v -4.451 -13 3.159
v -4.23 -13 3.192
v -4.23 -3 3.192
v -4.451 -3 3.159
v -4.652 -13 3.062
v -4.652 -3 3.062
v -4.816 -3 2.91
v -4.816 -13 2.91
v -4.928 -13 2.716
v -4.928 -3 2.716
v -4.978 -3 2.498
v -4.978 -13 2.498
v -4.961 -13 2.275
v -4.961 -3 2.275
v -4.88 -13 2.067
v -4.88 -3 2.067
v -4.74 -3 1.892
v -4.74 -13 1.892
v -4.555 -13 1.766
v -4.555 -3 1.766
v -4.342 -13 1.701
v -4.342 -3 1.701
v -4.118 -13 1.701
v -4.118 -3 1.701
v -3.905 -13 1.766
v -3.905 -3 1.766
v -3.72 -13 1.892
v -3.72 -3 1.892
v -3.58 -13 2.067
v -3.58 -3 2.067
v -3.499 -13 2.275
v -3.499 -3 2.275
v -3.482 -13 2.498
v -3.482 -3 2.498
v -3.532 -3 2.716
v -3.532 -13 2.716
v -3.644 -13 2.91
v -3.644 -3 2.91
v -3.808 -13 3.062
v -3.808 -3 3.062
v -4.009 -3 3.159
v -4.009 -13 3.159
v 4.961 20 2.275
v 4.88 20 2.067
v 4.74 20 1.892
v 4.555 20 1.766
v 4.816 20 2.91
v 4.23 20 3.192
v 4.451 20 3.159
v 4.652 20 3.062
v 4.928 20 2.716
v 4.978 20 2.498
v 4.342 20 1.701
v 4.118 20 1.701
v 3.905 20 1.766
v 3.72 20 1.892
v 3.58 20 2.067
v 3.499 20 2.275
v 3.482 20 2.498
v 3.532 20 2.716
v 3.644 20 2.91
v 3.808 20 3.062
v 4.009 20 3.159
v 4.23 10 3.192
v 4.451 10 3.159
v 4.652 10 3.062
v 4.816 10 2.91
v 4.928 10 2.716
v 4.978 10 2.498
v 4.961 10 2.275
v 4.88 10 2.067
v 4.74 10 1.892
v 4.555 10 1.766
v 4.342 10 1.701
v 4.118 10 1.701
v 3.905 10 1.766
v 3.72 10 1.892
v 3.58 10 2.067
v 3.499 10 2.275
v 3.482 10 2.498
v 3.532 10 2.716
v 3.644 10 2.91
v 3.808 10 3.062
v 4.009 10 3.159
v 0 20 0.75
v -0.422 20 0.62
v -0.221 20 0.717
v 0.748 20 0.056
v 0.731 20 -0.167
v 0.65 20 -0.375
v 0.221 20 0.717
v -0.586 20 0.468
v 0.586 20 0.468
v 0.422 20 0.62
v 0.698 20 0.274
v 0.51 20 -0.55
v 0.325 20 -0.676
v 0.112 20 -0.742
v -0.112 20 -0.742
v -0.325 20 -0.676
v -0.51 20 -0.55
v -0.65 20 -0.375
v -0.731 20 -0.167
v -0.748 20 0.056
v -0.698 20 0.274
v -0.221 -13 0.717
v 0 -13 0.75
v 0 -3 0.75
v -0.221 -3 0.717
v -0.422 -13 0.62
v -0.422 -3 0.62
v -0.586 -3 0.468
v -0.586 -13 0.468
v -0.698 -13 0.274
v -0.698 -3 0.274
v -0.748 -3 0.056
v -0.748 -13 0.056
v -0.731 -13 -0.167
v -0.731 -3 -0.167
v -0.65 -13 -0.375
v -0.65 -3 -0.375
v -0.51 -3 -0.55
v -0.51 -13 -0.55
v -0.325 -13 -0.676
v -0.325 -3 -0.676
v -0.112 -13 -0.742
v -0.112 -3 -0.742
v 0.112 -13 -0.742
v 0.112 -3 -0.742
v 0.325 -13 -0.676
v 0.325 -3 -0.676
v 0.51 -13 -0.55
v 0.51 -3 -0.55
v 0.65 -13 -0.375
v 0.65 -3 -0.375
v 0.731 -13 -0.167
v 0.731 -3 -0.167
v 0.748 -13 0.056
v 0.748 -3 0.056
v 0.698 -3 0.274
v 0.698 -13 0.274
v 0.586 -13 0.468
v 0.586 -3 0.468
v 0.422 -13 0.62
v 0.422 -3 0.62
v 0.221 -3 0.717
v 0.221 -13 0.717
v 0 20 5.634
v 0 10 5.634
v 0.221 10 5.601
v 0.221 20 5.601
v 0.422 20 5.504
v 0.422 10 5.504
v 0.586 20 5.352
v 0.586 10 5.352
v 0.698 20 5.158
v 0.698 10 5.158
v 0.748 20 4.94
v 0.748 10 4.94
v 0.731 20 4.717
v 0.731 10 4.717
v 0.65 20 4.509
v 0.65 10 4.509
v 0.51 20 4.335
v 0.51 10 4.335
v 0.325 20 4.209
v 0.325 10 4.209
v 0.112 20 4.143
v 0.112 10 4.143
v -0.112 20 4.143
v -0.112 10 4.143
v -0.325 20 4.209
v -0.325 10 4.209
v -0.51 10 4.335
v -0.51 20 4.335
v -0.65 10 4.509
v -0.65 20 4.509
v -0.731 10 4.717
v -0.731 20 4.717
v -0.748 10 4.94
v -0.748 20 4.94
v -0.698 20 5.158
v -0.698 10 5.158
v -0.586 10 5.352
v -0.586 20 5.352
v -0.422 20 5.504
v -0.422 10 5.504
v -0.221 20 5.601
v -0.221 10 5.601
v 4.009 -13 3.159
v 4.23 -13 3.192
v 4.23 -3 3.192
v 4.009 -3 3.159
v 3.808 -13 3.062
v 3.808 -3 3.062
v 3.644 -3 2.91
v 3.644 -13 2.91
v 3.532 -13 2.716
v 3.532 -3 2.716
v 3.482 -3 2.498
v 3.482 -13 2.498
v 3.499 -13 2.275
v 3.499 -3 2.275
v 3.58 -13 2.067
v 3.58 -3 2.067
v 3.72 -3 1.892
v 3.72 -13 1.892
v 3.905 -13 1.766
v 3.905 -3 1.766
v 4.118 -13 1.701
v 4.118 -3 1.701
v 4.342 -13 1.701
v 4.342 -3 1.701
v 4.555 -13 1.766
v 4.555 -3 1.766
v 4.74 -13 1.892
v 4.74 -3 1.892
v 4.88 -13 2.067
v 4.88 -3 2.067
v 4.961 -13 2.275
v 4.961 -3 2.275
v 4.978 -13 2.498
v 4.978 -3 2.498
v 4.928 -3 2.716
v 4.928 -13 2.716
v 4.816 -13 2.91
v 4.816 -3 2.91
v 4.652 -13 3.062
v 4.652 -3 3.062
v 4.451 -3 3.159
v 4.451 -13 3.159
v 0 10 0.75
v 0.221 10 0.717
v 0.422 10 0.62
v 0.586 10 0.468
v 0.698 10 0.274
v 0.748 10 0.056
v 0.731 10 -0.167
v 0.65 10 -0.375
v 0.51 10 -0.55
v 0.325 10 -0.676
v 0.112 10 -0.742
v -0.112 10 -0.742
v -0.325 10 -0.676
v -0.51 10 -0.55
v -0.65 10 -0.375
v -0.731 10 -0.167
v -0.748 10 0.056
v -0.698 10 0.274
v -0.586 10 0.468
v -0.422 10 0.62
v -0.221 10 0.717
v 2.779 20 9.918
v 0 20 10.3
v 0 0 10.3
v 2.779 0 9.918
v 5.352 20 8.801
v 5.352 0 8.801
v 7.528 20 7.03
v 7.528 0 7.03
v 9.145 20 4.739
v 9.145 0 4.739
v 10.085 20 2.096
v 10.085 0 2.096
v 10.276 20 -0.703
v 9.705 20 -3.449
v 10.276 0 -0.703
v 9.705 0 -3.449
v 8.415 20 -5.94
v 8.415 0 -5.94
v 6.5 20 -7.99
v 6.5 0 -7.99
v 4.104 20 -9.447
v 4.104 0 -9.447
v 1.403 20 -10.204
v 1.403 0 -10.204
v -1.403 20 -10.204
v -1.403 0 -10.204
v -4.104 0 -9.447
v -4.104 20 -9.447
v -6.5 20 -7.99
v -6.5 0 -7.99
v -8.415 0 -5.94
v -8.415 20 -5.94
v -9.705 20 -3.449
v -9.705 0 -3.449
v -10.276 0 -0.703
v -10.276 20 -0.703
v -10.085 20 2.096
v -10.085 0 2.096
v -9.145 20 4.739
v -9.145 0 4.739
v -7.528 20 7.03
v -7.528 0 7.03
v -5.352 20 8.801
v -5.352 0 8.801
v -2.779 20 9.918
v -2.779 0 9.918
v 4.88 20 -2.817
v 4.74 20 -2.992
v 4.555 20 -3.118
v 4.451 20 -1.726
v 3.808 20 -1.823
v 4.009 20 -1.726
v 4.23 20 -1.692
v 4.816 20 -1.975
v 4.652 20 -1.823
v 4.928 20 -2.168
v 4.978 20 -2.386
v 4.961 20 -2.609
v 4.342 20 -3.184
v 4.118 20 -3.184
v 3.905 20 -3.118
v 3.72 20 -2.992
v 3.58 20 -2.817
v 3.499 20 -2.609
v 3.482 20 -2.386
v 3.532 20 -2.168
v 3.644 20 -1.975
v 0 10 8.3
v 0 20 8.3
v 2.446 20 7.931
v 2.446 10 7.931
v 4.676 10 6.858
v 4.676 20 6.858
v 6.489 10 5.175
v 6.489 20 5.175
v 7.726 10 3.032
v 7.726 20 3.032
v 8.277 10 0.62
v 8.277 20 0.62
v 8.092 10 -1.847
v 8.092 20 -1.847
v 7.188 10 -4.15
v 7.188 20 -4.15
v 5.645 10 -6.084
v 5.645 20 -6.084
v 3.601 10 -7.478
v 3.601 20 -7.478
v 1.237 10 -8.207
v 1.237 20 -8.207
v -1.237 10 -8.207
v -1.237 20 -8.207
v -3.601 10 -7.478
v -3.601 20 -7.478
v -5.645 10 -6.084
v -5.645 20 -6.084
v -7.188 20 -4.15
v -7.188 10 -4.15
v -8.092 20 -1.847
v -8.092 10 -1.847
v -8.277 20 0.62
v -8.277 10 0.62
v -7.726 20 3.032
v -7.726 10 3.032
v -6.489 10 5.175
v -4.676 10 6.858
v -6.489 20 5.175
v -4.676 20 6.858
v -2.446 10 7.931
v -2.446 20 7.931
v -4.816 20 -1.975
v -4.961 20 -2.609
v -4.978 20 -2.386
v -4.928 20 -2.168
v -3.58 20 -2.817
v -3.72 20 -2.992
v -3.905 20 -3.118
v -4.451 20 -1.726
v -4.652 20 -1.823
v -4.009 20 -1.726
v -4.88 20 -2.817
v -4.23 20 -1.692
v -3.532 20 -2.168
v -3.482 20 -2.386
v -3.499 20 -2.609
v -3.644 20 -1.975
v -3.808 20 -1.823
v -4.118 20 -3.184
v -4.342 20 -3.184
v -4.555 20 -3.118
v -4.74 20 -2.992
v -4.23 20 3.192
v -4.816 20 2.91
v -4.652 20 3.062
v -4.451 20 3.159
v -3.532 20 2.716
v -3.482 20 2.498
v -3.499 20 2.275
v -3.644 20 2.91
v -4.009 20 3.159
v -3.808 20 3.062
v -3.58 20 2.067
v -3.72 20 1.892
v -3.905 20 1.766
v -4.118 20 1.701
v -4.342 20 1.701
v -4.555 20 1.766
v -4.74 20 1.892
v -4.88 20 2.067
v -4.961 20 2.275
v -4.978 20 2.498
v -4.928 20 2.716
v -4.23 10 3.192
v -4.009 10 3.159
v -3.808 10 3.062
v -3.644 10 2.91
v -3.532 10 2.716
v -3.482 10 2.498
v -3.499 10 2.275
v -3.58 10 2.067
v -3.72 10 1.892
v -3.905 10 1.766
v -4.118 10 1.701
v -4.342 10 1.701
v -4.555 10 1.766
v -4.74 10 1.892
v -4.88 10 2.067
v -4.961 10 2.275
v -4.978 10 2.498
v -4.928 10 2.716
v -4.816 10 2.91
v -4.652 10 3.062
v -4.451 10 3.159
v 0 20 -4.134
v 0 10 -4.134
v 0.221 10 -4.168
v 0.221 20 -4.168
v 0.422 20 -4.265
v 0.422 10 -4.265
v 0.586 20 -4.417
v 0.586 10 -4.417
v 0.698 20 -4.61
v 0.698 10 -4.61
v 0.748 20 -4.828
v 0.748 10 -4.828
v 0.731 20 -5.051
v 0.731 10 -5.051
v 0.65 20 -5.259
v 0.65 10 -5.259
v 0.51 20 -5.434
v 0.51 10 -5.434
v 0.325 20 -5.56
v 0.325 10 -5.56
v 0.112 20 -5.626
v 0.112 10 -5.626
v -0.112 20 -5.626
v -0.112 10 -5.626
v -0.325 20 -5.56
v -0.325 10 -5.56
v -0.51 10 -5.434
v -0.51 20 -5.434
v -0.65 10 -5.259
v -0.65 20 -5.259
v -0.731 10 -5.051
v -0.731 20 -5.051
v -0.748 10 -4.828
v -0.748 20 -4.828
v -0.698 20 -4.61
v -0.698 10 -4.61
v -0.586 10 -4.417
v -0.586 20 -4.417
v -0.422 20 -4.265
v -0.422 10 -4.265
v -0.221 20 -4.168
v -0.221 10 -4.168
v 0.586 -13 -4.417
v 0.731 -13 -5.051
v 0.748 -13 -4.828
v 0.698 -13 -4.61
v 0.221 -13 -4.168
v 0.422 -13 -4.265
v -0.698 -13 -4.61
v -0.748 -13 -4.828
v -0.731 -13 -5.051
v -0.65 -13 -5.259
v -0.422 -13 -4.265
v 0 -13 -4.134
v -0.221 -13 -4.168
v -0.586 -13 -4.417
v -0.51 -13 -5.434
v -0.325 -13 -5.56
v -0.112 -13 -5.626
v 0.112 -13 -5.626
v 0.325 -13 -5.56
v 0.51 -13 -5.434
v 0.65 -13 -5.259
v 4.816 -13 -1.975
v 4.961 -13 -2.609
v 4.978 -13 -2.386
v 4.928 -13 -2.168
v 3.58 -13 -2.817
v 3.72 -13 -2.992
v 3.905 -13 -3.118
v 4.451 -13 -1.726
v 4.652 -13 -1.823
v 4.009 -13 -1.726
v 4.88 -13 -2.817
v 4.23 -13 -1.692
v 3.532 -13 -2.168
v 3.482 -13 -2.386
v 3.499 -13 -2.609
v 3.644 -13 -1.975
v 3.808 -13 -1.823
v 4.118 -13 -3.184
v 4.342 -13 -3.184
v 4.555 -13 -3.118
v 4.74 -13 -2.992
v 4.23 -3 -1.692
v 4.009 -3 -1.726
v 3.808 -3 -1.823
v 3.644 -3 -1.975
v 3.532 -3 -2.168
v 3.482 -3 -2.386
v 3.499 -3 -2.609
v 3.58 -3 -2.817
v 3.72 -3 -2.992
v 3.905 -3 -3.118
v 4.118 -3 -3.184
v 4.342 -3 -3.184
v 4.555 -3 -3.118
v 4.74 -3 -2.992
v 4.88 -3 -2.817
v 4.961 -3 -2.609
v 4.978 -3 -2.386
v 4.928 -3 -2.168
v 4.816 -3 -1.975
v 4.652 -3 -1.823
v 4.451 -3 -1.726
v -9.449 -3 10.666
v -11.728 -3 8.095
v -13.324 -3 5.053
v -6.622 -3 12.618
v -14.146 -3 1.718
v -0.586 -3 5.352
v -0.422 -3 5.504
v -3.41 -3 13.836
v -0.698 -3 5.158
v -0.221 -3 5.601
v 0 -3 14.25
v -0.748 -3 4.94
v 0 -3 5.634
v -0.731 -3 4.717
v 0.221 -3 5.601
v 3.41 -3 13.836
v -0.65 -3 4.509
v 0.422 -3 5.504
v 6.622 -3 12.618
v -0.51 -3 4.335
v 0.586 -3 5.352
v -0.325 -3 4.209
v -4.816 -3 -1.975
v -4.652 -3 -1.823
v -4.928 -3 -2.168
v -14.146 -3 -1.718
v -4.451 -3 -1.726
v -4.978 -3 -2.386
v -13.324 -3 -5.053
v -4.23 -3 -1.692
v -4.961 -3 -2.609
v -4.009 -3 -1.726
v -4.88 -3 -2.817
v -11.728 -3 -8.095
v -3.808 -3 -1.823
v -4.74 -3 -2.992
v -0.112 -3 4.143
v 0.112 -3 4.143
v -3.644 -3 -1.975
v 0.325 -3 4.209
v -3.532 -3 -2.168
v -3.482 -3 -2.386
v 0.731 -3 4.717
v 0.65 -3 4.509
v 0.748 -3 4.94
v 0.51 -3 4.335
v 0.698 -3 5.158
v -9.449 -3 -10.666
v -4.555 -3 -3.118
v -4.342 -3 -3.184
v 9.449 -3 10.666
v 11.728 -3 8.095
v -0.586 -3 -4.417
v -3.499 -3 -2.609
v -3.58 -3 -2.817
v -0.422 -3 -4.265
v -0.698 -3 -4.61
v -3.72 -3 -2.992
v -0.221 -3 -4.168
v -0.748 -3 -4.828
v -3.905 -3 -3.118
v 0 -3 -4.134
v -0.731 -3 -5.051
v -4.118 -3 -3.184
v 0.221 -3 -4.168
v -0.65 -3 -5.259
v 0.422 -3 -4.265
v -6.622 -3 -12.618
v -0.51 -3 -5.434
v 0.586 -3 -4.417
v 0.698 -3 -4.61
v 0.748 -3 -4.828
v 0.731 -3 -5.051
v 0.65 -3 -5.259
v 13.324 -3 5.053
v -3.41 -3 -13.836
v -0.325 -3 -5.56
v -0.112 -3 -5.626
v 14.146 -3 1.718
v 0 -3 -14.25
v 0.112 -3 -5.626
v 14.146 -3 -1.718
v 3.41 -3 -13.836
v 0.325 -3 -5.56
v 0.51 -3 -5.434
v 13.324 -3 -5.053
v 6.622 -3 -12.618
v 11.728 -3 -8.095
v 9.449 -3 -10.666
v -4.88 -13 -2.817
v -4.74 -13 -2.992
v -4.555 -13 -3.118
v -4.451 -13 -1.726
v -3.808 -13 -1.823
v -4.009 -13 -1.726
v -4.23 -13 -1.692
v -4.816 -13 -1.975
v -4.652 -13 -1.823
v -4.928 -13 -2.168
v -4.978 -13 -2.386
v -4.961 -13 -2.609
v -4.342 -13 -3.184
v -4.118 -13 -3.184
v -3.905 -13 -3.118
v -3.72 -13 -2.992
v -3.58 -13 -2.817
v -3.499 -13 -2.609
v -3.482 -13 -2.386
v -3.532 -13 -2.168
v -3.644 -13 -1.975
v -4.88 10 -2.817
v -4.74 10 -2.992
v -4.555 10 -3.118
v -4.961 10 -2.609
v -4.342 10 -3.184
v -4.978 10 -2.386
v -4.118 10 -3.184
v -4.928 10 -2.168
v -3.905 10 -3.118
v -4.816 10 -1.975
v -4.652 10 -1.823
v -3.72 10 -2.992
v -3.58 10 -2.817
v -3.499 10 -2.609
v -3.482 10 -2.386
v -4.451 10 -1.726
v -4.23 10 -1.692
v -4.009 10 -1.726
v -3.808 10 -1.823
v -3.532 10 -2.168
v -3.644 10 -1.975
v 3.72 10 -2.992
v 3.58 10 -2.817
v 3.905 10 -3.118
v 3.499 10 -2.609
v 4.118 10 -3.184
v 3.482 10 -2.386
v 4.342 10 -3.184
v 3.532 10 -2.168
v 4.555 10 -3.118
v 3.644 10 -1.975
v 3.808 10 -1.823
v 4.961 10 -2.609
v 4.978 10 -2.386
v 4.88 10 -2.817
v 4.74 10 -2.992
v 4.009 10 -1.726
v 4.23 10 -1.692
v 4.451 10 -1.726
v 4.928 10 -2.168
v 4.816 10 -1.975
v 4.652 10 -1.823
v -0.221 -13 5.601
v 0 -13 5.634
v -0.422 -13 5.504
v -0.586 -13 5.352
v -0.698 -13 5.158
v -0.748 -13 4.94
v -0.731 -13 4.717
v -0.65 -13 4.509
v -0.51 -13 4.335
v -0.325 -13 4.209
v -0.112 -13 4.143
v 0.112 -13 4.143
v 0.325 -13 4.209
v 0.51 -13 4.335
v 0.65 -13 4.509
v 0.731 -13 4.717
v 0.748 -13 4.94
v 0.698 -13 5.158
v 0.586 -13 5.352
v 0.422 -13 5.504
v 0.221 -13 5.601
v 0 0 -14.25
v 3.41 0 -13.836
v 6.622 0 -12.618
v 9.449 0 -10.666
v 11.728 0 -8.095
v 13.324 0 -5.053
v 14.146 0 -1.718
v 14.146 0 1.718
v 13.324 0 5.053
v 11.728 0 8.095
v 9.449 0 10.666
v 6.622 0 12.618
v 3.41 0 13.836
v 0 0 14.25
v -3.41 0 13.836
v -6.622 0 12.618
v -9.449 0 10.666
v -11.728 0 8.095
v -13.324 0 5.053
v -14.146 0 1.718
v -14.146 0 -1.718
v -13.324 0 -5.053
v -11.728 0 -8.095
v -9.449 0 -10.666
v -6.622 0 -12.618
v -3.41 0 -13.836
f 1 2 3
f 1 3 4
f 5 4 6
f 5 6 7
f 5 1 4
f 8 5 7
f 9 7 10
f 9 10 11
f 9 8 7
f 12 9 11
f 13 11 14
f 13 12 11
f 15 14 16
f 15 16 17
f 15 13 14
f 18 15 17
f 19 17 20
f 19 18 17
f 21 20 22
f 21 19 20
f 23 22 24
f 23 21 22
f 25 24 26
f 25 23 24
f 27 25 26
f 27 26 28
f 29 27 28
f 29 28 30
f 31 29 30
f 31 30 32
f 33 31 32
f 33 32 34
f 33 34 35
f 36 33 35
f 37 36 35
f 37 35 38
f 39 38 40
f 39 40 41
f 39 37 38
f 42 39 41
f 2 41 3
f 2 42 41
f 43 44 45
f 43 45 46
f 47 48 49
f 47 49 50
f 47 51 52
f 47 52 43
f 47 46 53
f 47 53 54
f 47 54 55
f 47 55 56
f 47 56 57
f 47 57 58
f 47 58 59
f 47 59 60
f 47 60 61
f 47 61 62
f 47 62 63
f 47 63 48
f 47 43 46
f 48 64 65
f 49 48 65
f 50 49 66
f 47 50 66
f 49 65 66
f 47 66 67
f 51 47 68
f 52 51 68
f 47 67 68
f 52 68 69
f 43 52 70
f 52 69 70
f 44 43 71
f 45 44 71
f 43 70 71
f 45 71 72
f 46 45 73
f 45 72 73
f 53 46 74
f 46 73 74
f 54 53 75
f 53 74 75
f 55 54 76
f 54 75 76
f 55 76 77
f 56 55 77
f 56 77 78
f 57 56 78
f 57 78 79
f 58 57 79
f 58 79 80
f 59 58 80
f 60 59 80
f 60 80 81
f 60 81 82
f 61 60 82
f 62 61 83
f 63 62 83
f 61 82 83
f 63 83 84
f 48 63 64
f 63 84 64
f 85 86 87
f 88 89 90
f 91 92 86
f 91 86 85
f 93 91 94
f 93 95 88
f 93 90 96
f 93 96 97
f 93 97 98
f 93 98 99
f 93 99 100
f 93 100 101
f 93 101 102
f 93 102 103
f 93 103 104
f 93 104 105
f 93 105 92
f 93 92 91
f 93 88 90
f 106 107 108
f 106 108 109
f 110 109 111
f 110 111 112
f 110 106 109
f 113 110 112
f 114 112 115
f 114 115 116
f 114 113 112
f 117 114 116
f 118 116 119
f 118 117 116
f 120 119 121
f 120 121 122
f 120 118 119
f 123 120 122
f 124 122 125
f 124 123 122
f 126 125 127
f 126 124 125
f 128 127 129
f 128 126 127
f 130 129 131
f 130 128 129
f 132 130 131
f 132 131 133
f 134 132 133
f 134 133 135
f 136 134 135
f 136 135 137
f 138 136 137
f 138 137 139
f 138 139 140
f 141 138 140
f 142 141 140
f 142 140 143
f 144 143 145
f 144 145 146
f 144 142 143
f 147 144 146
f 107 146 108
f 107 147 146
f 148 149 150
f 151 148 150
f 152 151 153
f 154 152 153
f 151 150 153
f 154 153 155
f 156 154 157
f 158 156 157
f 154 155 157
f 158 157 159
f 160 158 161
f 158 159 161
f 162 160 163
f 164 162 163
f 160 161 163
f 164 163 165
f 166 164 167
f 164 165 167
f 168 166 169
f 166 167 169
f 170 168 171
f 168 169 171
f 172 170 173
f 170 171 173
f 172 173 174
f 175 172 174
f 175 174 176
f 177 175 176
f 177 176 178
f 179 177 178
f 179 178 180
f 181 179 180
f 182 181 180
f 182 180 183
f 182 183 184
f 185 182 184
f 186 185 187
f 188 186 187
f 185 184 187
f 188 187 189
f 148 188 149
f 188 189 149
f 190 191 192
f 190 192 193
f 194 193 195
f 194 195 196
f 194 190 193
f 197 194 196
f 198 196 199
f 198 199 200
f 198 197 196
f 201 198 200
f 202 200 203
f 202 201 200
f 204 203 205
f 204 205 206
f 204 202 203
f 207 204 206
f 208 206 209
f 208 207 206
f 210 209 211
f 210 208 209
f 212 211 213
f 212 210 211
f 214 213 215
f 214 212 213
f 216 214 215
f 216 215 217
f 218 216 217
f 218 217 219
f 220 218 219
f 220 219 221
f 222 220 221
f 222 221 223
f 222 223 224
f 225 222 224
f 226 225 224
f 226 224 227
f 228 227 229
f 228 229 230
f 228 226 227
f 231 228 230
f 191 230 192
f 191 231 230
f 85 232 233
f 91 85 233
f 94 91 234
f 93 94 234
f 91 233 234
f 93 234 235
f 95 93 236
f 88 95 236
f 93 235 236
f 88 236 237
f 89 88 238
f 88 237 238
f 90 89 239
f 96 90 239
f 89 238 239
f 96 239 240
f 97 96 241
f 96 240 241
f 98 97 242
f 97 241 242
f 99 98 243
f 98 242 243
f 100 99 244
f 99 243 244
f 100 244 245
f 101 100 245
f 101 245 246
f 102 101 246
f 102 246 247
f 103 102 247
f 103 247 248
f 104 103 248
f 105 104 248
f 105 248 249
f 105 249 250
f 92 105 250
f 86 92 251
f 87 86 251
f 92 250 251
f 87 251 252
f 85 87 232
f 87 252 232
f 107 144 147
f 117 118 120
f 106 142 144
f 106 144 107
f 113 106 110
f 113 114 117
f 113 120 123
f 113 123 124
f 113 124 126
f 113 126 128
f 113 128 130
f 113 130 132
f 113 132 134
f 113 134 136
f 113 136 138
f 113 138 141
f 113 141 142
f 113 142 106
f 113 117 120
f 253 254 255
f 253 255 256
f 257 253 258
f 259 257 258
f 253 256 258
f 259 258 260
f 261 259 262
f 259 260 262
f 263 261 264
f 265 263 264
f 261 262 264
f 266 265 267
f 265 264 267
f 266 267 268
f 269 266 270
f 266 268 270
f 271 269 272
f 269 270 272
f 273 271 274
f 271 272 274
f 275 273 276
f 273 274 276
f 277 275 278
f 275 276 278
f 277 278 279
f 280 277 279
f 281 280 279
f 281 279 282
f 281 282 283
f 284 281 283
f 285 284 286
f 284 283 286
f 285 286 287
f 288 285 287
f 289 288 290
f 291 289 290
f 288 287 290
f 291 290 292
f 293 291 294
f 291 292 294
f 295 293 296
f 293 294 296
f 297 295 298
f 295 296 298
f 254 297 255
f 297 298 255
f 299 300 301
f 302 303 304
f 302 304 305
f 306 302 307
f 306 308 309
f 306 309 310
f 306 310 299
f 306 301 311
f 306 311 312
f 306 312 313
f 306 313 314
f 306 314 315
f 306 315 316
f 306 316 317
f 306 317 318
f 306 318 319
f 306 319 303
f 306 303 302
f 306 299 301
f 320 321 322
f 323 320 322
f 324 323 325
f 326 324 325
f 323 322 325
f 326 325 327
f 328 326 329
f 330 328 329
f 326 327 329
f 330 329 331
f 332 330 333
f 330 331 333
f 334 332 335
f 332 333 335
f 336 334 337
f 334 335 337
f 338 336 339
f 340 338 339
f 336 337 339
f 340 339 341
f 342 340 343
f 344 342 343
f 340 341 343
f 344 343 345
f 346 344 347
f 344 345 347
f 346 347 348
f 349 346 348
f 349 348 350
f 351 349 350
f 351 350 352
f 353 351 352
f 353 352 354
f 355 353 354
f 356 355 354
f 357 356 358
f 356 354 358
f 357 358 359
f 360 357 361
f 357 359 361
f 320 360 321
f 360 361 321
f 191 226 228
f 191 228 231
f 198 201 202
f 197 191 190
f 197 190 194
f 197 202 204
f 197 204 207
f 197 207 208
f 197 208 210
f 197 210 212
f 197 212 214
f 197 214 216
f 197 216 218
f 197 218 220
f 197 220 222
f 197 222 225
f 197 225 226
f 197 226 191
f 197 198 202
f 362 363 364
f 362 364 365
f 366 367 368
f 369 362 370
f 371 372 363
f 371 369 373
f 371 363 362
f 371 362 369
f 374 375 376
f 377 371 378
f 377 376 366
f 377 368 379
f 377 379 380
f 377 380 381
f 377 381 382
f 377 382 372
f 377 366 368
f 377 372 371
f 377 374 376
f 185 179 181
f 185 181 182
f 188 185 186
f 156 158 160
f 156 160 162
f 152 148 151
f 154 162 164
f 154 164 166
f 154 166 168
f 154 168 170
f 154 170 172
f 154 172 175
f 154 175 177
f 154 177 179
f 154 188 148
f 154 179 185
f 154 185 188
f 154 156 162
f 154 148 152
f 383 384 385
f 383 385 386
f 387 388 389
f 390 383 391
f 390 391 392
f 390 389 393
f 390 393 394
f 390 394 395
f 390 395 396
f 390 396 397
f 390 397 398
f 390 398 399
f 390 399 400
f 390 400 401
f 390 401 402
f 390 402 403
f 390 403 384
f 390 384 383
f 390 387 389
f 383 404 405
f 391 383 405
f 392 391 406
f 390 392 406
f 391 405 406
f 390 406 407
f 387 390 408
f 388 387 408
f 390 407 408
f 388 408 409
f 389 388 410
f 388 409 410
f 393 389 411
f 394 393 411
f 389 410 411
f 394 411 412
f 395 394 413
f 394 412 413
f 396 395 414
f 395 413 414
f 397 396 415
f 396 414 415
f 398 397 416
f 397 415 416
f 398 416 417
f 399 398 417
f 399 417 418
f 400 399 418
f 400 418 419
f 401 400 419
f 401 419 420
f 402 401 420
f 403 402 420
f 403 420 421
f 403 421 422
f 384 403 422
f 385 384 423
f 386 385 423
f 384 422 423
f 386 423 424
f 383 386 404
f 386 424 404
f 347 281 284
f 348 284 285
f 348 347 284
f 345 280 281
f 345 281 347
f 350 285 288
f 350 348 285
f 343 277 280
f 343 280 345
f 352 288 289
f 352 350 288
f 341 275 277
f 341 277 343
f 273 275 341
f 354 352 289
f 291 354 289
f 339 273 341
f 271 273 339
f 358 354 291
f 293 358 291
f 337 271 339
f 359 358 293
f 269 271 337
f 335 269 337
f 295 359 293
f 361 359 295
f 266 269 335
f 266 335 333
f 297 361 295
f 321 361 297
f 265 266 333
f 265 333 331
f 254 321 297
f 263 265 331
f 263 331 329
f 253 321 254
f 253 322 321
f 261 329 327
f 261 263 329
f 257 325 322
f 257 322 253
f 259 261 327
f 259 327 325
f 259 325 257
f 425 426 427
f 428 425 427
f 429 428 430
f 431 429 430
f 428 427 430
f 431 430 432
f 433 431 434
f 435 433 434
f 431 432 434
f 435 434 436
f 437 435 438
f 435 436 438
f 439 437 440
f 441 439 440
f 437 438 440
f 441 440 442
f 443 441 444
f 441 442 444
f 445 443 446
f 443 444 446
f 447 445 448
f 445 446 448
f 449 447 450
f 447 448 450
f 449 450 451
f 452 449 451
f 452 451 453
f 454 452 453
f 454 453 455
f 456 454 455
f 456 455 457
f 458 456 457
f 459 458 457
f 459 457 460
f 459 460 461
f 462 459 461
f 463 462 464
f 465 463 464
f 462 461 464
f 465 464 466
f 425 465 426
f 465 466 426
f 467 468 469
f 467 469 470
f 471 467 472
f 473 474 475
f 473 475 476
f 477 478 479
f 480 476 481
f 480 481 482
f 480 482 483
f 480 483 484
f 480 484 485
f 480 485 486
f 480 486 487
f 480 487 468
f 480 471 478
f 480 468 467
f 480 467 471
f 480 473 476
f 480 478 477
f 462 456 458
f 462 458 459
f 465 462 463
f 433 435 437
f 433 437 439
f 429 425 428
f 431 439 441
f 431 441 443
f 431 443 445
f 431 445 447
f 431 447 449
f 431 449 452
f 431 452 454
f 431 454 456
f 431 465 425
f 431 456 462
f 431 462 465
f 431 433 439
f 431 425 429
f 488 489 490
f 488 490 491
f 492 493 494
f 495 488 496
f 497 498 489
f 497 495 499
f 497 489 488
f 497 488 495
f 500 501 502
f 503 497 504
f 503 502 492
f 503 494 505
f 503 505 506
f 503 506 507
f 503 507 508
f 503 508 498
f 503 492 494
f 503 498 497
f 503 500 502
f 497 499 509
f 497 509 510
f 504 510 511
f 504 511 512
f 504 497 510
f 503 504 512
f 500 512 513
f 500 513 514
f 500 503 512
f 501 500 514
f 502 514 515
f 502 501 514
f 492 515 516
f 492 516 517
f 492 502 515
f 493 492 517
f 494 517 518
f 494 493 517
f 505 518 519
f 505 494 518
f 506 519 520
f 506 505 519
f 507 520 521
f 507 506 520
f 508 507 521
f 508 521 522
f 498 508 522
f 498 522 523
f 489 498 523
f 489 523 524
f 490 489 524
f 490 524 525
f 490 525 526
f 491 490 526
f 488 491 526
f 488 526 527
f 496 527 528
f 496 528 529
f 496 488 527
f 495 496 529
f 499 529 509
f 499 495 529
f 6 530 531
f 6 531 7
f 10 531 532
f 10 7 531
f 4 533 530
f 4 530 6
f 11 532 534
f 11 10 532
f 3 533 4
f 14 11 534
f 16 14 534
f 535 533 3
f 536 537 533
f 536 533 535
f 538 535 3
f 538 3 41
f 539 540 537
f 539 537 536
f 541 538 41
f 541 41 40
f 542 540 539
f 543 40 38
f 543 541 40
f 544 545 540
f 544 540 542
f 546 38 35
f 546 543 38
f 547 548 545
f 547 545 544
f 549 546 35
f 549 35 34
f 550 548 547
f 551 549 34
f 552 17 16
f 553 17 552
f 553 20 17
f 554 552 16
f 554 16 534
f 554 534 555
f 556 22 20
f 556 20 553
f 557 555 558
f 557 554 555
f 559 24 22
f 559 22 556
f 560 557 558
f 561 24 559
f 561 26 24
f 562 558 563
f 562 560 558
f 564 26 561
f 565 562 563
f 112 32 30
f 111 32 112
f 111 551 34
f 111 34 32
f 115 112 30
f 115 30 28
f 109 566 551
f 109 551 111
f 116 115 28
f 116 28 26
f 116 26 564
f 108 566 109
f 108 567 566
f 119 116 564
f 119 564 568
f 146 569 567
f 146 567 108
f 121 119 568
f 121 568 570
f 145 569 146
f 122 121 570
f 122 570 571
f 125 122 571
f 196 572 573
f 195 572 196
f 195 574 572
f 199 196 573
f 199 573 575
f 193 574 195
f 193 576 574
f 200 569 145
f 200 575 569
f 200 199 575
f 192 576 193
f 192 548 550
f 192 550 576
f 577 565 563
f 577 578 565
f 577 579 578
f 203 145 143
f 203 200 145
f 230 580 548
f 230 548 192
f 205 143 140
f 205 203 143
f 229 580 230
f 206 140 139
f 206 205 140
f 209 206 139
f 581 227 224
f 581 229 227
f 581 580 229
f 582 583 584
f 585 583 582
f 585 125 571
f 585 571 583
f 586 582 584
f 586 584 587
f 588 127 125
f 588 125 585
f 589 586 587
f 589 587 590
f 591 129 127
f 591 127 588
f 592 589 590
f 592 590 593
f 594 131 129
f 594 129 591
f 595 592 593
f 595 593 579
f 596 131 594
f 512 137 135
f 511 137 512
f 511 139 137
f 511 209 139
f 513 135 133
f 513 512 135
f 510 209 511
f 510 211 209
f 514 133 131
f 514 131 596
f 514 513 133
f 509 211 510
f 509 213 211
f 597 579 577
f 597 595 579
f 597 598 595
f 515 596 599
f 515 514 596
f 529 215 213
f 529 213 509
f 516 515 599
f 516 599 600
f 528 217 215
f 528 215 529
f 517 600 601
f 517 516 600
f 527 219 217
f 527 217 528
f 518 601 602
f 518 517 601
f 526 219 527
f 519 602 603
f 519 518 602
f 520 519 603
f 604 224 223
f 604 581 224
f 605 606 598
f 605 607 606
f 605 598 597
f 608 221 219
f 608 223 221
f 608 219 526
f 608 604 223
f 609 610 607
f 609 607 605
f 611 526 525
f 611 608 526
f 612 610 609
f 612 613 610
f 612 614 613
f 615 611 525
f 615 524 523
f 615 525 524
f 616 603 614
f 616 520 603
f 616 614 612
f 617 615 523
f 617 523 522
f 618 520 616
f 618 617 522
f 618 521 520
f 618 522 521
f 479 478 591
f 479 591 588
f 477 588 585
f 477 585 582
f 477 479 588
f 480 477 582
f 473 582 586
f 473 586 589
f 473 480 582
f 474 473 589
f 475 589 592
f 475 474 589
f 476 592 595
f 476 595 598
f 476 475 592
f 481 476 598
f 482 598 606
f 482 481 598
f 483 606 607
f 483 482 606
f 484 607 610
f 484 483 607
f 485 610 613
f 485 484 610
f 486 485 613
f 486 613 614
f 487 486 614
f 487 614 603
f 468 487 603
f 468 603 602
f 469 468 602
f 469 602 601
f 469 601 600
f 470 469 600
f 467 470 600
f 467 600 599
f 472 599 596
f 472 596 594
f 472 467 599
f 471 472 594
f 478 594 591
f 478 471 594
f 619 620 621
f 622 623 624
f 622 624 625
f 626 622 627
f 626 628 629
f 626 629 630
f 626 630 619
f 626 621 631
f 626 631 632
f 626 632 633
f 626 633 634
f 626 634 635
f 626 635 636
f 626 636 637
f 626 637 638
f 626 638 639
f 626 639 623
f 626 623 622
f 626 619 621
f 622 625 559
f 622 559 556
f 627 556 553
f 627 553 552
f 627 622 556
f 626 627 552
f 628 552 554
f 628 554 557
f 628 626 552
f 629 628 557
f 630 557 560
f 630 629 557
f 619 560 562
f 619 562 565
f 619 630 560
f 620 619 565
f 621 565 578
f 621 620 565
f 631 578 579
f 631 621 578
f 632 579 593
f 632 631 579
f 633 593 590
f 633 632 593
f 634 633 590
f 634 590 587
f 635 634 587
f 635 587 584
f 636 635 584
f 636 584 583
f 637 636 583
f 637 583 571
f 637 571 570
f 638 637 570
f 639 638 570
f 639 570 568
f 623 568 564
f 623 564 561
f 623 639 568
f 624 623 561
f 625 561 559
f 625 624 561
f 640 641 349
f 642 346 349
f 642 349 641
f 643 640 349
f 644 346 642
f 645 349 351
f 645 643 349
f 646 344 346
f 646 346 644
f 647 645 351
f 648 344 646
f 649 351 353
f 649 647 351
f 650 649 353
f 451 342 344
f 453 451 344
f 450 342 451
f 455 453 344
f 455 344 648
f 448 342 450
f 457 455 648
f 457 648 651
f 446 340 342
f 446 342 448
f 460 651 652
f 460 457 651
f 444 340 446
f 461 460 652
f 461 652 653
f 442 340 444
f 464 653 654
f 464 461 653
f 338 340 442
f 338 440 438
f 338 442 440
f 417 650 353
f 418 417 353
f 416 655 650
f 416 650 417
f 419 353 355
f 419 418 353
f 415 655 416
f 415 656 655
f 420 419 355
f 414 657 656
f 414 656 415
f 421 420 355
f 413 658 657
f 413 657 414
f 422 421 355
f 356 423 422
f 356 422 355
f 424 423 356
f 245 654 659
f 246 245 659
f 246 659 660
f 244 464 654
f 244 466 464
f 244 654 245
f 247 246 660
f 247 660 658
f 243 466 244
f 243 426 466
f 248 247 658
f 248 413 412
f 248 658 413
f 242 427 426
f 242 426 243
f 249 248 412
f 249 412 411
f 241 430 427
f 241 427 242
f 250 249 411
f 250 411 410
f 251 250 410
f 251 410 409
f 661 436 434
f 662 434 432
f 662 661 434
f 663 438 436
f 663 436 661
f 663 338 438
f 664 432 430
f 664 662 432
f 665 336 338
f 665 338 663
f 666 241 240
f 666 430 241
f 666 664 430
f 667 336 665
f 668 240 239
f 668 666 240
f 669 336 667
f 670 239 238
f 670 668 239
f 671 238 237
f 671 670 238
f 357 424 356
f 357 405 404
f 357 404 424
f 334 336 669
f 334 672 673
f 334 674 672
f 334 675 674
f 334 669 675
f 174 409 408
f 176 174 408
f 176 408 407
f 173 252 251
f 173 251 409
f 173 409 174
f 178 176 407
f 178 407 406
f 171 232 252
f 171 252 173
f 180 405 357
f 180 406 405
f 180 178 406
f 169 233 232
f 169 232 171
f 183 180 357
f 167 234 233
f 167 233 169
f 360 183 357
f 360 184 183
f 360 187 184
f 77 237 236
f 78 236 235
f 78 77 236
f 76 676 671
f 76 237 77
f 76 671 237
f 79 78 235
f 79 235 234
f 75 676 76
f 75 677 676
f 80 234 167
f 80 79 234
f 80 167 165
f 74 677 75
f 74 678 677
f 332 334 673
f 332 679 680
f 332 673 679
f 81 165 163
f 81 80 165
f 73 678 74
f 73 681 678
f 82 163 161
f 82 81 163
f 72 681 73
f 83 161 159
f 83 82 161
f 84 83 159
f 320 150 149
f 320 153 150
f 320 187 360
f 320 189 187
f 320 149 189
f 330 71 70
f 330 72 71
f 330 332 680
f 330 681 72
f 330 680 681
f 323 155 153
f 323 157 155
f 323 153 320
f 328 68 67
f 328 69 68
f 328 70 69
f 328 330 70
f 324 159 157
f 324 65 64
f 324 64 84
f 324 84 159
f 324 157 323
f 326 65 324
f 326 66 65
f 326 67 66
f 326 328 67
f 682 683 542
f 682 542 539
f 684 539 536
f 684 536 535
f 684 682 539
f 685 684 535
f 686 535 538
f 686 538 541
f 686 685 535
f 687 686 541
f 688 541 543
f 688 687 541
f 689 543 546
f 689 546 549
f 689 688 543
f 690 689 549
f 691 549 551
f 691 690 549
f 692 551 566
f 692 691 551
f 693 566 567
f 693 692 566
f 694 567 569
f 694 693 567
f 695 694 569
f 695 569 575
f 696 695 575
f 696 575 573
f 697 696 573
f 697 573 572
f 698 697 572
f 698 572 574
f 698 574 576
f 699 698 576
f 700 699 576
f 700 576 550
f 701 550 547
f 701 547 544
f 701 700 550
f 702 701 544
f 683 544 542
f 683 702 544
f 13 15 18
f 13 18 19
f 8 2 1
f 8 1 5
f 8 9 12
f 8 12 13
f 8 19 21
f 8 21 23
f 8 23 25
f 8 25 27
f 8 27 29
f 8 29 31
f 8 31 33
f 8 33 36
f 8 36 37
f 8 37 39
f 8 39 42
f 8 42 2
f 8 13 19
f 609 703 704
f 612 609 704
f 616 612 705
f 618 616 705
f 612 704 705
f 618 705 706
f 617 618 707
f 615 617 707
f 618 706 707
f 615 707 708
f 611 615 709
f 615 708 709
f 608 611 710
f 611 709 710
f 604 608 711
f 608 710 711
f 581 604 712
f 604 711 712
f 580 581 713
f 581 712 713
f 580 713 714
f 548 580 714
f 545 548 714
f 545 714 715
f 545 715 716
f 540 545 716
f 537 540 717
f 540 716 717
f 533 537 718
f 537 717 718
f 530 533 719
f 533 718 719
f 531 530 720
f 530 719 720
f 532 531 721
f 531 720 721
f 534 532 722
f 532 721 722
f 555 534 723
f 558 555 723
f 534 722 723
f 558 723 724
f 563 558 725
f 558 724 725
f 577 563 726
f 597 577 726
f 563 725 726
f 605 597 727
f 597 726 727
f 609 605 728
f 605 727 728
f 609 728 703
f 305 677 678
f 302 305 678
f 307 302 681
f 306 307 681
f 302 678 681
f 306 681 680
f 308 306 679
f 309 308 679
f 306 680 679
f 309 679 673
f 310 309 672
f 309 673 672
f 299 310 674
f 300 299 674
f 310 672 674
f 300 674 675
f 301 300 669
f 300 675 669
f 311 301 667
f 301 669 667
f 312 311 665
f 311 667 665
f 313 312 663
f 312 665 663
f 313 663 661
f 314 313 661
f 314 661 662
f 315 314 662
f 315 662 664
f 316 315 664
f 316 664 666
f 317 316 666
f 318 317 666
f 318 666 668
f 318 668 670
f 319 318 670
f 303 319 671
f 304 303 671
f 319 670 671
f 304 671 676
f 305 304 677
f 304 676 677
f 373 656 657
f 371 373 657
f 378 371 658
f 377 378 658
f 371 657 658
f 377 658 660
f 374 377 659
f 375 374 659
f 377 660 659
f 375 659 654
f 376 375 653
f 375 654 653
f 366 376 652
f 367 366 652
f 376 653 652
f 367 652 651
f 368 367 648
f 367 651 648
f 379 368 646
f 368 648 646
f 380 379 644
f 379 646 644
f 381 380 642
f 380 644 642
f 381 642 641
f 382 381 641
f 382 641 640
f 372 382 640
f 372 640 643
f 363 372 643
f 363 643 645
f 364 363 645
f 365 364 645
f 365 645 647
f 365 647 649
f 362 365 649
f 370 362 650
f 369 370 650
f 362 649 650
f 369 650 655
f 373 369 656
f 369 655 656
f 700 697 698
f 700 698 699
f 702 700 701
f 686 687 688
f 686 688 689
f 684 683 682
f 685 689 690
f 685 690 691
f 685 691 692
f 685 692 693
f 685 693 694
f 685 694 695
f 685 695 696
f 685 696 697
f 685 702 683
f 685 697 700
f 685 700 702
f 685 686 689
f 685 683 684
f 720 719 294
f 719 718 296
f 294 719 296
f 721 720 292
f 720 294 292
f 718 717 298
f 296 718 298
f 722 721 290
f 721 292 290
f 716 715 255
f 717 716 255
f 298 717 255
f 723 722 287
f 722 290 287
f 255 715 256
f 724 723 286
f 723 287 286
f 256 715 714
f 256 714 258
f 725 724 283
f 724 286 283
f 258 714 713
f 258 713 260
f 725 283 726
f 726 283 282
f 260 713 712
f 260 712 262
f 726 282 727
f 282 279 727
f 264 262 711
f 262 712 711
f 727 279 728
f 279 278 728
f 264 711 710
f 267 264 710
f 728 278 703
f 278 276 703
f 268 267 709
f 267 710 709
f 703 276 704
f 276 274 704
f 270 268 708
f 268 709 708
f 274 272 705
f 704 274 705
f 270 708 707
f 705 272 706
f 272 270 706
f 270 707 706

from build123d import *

# Parameters (mm, degrees)
SKETCH1_R           = 10.3
BOSS_EXTRUDE1_DEPTH = 20
SKETCH2_R           = 14.25
BOSS_EXTRUDE2_DEPTH = 3
SKETCH3_R           = 8.3
CUT_EXTRUDE1_DEPTH  = 10
SKETCH4_R           = 0.75
BOSS_EXTRUDE3_DEPTH = 10
BOSS_EXTRUDE4_START = 10
SKETCH5_R           = 0.75
BOSS_EXTRUDE4_DEPTH = 10


with BuildPart() as part:
    # Sketch1 → Boss-Extrude1 (new body)
    with BuildSketch(Plane(origin=(0, 0, 0), x_dir=(1, 0, 0), z_dir=(0, 1, 0))):
        with Locations(Location((0, 0, 0), (0, 0, 270))):
            Circle(SKETCH1_R)
    extrude(amount=BOSS_EXTRUDE1_DEPTH)

    # Sketch2 → Boss-Extrude2 (add)
    with BuildSketch(Plane.XZ):
        with Locations(Location((0, 0, 0), (0, 0, 270))):
            Circle(SKETCH2_R)
    extrude(amount=BOSS_EXTRUDE2_DEPTH)

    # Sketch3 → Cut-Extrude1 (cut)
    with BuildSketch(Plane(origin=(0, 20, 0), x_dir=(1, 0, 0), z_dir=(0, 1, 0))):
        with Locations(Location((0, 0, 0), (0, 0, 270))):
            Circle(SKETCH3_R)
    extrude(amount=-CUT_EXTRUDE1_DEPTH, mode=Mode.SUBTRACT)

    # Sketch4 → Boss-Extrude3 (add)
    with BuildSketch(Plane(origin=(0, 10, 0), x_dir=(1, 0, 0), z_dir=(0, 1, 0))):
        with Locations(Location((0, 4.884385532, 0), (0, 0, 270))):
            Circle(SKETCH4_R)
        with Locations(Location((4.230001953, 2.442192766, 0), (0, 0, 270))):
            Circle(SKETCH4_R)
        with Locations(Location((4.230001953, -2.442192766, 0), (0, 0, 270))):
            Circle(SKETCH4_R)
        with Locations(Location((0, -4.884385532, 0), (0, 0, 270))):
            Circle(SKETCH4_R)
        with Locations(Location((-4.230001953, -2.442192766, 0), (0, 0, 270))):
            Circle(SKETCH4_R)
        with Locations(Location((-4.230001953, 2.442192766, 0), (0, 0, 270))):
            Circle(SKETCH4_R)
        with Locations(Location((0, 0, 0), (0, 0, 270))):
            Circle(SKETCH4_R)
    extrude(amount=BOSS_EXTRUDE3_DEPTH)

    # Sketch5 → Boss-Extrude4 (add)
    with BuildSketch(Plane.XZ.offset(3).offset(BOSS_EXTRUDE4_START)):
        with Locations(Location((0, 0, 0), (0, 0, 90))):
            Circle(SKETCH5_R)
        with Locations(Location((-4.230001953, -2.442192766, 0), (0, 0, 90))):
            Circle(SKETCH5_R)
        with Locations(Location((-4.230001953, 2.442192766, 0), (0, 0, 90))):
            Circle(SKETCH5_R)
        with Locations(Location((0, 4.884385532, 0), (0, 0, 90))):
            Circle(SKETCH5_R)
        with Locations(Location((4.230001953, 2.442192766, 0), (0, 0, 90))):
            Circle(SKETCH5_R)
        with Locations(Location((4.230001953, -2.442192766, 0), (0, 0, 90))):
            Circle(SKETCH5_R)
        with Locations(Location((0, -4.884385532, 0), (0, 0, 90))):
            Circle(SKETCH5_R)
    extrude(amount=-BOSS_EXTRUDE4_DEPTH)


solid = part.part
